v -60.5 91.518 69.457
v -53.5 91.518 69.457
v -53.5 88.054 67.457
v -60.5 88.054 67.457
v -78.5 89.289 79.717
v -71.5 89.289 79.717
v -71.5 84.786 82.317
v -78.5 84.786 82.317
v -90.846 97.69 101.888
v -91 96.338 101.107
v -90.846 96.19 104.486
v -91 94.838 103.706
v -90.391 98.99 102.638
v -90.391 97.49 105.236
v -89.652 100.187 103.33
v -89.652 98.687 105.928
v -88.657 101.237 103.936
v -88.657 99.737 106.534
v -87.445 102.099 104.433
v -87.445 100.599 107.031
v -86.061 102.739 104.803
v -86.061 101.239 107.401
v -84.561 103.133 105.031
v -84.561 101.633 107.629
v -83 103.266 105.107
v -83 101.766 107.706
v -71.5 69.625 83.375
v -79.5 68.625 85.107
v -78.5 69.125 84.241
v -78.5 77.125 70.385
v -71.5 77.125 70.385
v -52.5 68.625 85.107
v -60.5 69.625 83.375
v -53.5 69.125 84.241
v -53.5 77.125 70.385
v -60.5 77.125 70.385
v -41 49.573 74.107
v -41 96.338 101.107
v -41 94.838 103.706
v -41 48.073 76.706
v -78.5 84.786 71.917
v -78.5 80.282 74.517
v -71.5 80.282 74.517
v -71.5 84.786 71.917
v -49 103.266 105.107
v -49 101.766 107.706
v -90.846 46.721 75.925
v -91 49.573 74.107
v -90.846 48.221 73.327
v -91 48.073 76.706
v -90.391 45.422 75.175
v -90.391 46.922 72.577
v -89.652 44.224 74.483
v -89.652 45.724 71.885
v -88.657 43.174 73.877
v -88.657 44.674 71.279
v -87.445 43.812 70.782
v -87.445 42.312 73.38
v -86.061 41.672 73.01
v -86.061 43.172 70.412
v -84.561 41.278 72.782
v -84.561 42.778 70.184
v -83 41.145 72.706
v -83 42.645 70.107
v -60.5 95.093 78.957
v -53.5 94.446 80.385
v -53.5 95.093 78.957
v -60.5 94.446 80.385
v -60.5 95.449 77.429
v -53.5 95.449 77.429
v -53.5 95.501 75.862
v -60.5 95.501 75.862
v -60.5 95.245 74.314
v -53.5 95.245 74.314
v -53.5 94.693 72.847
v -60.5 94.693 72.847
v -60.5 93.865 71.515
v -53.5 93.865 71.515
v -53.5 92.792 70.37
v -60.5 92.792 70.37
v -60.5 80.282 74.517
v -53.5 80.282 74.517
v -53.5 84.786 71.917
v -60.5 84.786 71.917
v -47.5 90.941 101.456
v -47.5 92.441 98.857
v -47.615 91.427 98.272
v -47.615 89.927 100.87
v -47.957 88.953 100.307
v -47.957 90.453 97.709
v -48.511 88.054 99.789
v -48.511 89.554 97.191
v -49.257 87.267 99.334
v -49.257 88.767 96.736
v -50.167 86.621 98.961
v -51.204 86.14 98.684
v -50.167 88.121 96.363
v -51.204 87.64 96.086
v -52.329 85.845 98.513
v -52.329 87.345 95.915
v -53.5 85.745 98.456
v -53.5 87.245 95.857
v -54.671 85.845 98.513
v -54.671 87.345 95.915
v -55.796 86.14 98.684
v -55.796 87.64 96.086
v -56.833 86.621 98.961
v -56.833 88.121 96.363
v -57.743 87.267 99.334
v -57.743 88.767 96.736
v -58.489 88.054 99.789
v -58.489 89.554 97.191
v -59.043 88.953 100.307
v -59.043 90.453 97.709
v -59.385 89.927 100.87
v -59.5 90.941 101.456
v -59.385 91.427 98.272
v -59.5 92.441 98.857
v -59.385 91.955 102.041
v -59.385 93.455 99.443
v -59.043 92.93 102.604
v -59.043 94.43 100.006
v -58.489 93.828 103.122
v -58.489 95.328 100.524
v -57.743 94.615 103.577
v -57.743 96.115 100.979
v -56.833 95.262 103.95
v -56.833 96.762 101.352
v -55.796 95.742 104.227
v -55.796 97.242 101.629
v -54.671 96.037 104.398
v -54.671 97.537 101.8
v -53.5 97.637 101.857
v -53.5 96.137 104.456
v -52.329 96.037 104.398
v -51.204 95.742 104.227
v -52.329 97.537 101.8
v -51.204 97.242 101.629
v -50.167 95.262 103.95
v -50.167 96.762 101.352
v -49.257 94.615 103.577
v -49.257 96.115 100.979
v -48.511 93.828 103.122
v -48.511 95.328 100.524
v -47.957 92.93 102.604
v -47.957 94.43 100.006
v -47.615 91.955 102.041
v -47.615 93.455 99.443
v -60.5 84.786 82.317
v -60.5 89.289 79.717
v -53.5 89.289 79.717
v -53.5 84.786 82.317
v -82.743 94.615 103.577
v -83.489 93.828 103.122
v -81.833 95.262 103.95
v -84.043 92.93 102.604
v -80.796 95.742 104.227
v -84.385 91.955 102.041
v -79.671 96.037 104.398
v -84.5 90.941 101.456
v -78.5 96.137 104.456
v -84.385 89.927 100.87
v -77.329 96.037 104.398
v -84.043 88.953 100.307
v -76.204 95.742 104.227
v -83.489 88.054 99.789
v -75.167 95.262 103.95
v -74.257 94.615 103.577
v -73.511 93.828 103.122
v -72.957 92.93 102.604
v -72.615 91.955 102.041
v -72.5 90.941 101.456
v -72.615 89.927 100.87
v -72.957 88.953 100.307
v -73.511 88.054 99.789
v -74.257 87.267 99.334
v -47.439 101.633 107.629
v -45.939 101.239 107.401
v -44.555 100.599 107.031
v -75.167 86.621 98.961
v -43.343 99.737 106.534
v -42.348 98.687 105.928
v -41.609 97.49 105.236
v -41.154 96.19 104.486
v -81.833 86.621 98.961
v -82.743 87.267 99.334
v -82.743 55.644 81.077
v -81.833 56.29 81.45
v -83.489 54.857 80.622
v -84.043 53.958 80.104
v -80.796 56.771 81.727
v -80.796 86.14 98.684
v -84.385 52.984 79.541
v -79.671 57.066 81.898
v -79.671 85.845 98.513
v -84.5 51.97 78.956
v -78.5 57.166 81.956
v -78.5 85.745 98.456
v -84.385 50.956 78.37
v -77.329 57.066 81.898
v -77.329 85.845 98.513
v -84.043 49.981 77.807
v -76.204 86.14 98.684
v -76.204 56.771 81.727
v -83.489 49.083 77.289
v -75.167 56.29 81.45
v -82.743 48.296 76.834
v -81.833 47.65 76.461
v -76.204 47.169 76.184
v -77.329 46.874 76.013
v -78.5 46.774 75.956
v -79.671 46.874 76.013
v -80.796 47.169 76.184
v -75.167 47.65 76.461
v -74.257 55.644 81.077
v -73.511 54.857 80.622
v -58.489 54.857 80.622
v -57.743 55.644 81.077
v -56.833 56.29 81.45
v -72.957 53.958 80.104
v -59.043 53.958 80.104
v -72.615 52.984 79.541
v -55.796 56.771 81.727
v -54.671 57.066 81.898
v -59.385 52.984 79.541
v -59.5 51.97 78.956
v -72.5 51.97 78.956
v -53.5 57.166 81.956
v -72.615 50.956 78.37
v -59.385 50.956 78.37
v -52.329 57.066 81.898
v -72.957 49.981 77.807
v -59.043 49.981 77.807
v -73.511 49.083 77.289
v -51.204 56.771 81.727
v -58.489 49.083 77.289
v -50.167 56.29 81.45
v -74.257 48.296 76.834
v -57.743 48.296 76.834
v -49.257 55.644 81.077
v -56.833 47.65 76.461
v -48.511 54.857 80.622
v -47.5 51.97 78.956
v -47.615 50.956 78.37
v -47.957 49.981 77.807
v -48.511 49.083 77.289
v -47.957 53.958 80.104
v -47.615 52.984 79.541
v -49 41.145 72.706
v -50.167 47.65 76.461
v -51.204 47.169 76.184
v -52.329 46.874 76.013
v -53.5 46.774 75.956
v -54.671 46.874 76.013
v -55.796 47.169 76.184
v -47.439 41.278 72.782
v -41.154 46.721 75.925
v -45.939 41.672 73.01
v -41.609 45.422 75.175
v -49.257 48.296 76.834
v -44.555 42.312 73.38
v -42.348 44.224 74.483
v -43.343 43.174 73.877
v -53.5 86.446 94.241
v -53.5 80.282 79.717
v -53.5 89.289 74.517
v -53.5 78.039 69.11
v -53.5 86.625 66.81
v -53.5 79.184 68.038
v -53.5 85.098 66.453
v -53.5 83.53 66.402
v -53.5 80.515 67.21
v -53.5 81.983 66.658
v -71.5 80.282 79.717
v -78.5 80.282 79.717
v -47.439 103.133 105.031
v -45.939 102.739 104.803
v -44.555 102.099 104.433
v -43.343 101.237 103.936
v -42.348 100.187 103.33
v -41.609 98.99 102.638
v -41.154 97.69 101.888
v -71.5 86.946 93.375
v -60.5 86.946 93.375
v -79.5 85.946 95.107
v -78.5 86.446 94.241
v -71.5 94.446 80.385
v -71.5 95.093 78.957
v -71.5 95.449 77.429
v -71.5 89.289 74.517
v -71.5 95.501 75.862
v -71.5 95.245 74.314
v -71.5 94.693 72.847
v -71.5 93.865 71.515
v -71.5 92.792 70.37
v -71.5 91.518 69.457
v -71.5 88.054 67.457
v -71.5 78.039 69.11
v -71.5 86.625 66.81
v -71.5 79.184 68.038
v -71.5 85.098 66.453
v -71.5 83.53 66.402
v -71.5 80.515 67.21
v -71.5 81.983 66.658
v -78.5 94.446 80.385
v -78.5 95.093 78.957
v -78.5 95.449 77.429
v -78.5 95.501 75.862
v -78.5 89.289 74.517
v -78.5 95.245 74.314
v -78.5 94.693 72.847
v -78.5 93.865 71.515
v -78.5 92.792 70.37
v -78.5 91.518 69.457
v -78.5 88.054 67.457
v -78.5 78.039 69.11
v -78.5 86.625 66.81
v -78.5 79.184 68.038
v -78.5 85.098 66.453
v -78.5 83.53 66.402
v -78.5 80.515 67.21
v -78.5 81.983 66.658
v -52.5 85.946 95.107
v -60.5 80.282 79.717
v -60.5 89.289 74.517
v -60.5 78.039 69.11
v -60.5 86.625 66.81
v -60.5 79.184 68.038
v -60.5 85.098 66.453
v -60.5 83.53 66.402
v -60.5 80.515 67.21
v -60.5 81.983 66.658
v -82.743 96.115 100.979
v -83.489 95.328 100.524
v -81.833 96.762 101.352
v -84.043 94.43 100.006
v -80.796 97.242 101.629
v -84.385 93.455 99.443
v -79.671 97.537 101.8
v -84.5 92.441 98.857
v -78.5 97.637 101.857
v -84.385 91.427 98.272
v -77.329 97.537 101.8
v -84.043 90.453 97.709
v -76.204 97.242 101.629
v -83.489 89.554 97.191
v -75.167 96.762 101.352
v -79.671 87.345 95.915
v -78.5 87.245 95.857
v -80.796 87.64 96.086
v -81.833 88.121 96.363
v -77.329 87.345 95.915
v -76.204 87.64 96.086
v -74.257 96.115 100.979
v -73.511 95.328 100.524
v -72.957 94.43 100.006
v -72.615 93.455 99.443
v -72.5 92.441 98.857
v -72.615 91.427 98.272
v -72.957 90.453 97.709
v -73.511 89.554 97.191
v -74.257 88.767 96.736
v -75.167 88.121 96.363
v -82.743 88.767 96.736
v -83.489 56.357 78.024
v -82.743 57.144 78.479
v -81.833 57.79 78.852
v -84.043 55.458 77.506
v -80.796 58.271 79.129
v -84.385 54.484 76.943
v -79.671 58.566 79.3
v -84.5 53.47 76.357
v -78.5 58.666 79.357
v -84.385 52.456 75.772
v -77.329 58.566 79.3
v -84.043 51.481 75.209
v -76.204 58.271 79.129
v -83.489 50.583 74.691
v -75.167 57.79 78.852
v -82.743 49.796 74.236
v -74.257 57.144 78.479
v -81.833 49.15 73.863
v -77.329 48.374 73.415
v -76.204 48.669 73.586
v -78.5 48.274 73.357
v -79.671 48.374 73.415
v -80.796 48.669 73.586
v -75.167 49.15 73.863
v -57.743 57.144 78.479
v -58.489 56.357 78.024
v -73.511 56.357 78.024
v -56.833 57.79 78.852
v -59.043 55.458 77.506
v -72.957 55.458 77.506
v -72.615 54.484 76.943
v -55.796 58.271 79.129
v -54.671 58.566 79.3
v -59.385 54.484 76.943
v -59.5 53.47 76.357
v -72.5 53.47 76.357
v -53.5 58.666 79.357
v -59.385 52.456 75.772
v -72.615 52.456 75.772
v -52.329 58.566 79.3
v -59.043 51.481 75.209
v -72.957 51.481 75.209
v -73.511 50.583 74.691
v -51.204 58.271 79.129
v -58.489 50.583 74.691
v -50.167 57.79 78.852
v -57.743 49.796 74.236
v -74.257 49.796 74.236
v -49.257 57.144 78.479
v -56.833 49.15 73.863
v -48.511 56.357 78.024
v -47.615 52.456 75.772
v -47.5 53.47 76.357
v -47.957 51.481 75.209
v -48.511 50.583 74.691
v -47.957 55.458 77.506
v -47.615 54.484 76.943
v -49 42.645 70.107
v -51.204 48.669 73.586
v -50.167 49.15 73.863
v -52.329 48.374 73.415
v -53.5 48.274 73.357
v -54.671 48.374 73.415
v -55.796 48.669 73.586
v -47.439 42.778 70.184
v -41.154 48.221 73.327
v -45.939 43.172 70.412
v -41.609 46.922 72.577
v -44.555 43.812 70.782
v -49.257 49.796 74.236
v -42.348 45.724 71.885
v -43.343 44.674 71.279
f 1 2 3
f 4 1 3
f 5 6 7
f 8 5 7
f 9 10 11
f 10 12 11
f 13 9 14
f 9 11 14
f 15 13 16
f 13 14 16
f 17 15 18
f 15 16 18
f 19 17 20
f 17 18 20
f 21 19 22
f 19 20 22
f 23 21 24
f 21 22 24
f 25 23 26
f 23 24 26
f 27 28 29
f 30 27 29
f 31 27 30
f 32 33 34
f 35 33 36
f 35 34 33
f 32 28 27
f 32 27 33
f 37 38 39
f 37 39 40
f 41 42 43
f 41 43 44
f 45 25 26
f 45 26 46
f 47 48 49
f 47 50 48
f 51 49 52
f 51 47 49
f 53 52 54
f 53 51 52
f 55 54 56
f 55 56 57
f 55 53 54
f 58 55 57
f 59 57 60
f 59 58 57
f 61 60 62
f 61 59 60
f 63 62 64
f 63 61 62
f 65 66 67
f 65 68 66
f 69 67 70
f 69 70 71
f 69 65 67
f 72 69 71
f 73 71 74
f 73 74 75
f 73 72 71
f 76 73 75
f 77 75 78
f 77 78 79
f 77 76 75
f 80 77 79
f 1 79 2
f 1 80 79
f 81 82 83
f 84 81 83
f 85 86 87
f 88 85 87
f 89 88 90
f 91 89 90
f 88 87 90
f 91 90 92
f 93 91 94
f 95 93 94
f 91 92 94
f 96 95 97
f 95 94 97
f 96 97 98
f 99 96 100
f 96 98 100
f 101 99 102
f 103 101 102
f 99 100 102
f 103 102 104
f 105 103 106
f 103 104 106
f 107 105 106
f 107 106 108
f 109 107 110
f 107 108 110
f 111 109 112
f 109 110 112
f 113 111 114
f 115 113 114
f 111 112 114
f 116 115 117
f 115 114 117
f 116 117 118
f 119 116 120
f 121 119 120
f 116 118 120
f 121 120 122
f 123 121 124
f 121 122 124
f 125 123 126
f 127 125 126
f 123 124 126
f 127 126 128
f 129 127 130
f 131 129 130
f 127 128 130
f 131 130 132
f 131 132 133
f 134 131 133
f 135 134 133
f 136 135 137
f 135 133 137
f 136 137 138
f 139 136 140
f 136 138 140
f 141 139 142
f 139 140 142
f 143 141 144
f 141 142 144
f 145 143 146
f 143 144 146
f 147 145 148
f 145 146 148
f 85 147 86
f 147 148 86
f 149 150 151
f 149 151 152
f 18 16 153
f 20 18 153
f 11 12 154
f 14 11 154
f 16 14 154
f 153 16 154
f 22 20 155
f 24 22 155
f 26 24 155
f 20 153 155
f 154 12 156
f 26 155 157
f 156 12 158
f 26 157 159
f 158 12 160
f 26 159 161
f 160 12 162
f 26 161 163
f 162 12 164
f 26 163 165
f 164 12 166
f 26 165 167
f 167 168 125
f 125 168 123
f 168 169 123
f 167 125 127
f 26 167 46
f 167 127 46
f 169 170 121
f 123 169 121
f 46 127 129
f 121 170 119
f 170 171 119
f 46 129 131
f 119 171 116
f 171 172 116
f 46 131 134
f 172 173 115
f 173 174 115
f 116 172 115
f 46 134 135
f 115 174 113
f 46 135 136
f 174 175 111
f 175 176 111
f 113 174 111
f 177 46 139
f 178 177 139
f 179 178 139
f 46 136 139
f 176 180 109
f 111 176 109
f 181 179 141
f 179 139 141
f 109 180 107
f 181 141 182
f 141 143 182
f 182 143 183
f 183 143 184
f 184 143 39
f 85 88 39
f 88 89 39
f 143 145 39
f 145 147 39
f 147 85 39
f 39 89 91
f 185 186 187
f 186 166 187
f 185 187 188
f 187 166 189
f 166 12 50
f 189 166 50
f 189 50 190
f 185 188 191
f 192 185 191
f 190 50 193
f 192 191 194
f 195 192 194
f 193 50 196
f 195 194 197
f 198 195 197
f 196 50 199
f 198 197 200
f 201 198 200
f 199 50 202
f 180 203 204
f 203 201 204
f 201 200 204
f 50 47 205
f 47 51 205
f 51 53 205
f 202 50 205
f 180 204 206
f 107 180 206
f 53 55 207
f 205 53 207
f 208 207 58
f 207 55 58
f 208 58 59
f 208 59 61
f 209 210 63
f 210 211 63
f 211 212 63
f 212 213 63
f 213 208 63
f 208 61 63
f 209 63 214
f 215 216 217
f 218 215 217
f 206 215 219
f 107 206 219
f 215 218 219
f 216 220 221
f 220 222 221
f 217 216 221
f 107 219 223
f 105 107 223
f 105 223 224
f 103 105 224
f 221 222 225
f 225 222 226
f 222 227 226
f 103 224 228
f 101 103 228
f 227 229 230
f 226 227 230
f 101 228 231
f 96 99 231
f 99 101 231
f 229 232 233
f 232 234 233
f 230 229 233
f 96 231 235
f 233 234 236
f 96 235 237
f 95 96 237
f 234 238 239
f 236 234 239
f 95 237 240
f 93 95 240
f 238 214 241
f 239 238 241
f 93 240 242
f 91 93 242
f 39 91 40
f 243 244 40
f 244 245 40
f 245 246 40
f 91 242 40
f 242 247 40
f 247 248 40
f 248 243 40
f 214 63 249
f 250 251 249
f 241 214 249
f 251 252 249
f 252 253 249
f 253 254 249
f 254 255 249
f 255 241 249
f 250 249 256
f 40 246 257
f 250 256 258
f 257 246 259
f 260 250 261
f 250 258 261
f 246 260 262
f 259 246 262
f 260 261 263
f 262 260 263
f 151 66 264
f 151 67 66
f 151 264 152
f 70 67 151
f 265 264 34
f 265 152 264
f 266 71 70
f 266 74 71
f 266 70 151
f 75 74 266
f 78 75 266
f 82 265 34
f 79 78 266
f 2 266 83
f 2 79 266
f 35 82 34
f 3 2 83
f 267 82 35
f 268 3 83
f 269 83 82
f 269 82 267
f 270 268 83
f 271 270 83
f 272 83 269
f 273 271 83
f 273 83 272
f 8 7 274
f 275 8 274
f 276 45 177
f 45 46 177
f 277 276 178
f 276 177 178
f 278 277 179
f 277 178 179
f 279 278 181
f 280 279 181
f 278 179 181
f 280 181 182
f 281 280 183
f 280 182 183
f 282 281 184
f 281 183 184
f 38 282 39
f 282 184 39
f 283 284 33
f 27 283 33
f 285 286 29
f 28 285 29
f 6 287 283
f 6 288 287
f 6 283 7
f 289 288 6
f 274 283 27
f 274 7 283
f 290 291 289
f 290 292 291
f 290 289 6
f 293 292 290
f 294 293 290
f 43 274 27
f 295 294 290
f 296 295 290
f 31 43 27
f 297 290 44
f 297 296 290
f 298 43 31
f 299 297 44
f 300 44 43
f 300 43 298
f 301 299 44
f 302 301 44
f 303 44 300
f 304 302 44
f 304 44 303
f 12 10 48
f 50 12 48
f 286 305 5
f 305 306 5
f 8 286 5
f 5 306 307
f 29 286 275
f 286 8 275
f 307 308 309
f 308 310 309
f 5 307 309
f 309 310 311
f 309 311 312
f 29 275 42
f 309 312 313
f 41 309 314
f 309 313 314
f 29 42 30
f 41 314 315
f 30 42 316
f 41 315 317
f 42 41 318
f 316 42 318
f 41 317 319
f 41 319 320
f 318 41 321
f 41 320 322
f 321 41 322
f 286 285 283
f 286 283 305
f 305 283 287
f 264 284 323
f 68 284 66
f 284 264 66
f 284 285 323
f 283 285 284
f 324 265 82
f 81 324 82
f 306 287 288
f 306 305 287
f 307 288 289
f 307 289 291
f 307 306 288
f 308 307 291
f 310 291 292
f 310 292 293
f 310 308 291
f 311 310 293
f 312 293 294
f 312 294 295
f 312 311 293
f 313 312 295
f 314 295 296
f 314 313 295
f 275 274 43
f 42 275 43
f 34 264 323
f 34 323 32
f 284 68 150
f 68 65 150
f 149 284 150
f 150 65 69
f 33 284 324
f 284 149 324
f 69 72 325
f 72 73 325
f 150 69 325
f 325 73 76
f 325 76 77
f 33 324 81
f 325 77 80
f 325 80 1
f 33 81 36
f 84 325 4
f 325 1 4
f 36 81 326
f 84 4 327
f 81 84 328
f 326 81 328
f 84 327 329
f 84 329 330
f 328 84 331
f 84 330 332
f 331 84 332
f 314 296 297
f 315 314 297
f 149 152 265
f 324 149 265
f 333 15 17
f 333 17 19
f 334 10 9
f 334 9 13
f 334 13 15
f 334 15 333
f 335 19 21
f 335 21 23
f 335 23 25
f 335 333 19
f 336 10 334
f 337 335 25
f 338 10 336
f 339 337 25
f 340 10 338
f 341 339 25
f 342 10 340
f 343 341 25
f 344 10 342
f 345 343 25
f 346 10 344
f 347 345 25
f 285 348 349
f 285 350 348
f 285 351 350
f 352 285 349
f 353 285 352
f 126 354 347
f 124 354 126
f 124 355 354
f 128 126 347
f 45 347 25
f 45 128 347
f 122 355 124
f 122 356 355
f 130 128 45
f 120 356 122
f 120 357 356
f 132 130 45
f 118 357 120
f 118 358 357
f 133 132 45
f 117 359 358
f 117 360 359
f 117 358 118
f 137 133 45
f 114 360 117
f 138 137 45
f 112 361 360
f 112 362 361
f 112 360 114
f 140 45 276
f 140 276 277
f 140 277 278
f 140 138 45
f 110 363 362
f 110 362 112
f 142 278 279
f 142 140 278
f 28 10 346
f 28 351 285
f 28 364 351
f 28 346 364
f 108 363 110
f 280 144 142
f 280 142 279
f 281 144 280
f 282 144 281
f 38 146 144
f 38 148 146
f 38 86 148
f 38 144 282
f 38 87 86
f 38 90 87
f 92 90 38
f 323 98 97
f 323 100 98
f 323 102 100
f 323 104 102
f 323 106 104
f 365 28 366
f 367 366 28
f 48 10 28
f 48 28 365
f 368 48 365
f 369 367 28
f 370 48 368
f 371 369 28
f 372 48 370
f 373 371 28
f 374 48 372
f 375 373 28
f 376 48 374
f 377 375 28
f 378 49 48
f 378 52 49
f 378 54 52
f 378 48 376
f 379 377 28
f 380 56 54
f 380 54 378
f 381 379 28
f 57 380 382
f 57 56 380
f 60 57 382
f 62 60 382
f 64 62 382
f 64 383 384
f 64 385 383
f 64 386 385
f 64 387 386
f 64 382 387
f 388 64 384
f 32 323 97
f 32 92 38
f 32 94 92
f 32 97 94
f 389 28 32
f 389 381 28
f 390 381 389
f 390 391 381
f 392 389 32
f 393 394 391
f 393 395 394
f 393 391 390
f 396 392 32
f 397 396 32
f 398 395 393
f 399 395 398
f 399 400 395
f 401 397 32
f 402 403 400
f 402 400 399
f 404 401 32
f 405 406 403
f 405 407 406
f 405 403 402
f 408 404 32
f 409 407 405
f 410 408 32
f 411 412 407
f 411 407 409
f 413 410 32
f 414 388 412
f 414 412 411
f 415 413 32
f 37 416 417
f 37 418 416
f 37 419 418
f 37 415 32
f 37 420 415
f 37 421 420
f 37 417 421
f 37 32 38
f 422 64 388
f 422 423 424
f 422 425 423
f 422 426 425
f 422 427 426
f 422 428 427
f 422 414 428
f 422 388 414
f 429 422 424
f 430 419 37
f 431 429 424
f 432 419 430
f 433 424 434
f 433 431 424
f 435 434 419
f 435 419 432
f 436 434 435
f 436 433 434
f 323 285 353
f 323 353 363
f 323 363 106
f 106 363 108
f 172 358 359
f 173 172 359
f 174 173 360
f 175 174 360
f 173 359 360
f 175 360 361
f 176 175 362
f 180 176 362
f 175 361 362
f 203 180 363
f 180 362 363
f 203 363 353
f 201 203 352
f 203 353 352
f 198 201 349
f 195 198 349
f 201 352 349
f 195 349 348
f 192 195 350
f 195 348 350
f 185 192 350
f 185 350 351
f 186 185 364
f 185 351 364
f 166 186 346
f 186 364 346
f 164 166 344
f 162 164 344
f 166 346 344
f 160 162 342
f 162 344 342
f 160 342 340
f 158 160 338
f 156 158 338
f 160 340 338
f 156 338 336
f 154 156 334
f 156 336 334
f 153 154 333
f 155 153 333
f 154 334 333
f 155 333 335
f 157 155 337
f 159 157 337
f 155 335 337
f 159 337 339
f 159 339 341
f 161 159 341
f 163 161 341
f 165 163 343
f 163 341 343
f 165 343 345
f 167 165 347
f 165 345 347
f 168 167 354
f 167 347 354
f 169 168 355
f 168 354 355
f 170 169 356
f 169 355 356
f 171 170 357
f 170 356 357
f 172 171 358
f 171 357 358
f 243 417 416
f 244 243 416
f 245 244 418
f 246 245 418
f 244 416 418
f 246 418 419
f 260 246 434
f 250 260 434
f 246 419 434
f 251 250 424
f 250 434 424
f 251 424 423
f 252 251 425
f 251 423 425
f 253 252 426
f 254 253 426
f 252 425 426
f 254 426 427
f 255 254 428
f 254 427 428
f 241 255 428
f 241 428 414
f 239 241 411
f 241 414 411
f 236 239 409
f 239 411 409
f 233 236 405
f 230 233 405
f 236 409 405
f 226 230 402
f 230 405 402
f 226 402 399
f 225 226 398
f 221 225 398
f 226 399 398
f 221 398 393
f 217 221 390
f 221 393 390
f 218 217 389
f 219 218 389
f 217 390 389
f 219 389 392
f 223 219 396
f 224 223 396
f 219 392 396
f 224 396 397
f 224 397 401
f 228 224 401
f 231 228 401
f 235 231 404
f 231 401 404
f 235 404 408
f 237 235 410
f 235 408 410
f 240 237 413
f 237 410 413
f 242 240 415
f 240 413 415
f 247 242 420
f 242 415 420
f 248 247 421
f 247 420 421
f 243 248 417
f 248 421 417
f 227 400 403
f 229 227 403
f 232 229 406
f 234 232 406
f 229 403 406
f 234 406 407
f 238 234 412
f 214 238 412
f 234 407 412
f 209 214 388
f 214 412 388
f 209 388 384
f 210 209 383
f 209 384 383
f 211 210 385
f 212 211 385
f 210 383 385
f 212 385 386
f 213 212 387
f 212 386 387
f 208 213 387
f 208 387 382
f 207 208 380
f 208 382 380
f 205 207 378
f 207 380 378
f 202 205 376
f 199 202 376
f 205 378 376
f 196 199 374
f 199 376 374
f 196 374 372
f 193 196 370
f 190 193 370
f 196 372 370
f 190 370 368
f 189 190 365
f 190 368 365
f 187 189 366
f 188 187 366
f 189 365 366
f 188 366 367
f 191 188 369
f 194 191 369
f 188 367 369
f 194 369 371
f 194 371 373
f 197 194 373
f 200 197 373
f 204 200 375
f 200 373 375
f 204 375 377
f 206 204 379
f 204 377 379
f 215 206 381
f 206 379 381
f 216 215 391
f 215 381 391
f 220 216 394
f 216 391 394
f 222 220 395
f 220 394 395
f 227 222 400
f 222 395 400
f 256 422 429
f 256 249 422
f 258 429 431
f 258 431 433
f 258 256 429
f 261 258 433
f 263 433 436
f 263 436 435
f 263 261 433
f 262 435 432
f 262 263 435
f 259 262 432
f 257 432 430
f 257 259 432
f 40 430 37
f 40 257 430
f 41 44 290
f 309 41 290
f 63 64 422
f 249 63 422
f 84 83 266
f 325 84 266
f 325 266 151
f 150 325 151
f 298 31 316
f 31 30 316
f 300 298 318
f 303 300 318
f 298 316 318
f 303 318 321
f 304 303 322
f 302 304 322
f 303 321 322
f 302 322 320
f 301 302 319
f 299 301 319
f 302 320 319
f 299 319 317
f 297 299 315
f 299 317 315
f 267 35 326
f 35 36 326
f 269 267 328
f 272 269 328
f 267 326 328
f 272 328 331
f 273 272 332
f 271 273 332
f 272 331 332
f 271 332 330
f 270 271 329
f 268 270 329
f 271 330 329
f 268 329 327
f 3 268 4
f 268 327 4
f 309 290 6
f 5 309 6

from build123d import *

# Parameters (mm, degrees)
SKETCH069_W             = 50
SKETCH069_H             = 70
SKETCH069_R             = 6
PAD033_DEPTH            = 3
SKETCH068_W             = 20
SKETCH068_H             = 25
PAD034_DEPTH            = 12.5
SKETCH067_W             = 40
SKETCH067_H             = 33
POCKET027_DEPTH         = 5.5
FILLET_R                = 8
CHAMFER001_SIZE         = 1
BODY014_PLACEMENT_ANGLE = 210


with BuildPart() as part:
    # Sketch069 → Pad033 (new body)
    with BuildSketch(Plane.XY):
        with Locations((0, 5)):
            Rectangle(SKETCH069_W, SKETCH069_H)
        with Locations((-12.5, 27.5)):
            Circle(SKETCH069_R, mode=Mode.SUBTRACT)
        with Locations((12.5, 27.5)):
            Circle(SKETCH069_R, mode=Mode.SUBTRACT)
        with Locations((-12.5, -17.5)):
            Circle(SKETCH069_R, mode=Mode.SUBTRACT)
        with Locations((12.5, -17.5)):
            Circle(SKETCH069_R, mode=Mode.SUBTRACT)
    extrude(amount=-PAD033_DEPTH)

    # Sketch068 → Pad034 (join, symmetric)
    with BuildSketch(Plane.YZ):
        with Locations((0, 12.5)):
            Rectangle(SKETCH068_W, SKETCH068_H)
        Polygon((2.6, 10.496668), (5.2, 15), (2.6, 19.503332), (-2.6, 19.503332), (-5.2, 15), (-2.6, 10.496668), align=None, mode=Mode.SUBTRACT)
    extrude(amount=PAD034_DEPTH, both=True)

    # Sketch067 → Pocket027 (cut, symmetric)
    with BuildSketch(Plane.YZ):
        with Locations((0, 18.5)):
            Rectangle(SKETCH067_W, SKETCH067_H)
    extrude(amount=POCKET027_DEPTH, both=True, mode=Mode.SUBTRACT)

    # Fillet
    fillet_edges = [part.edges().sort_by_distance(p)[0] for p in [
        (-25, -30, -1.5),
        (-25, 40, -1.5),
        (25, 40, -1.5),
        (25, -30, -1.5),
        (-9, 10, 25),
        (9, 10, 25),
        (-9, -10, 25),
        (9, -10, 25),
    ]]
    fillet(fillet_edges, radius=FILLET_R)

    # Chamfer001
    chamfer001_edges = [part.edges().sort_by_distance(p)[0] for p in [
        (12.5, 0, 0),
        (-12.5, 0, 0),
    ]]
    chamfer(chamfer001_edges, length=CHAMFER001_SIZE)


with BuildPart() as part_1:
    # Body014 placement: moved
    add(part.part.moved(Location((-66, 77.285671, 90.10746))).rotate(Axis((-66, 77.285671, 90.10746), (1, 0, 0)), BODY014_PLACEMENT_ANGLE))


solid = part_1.part
